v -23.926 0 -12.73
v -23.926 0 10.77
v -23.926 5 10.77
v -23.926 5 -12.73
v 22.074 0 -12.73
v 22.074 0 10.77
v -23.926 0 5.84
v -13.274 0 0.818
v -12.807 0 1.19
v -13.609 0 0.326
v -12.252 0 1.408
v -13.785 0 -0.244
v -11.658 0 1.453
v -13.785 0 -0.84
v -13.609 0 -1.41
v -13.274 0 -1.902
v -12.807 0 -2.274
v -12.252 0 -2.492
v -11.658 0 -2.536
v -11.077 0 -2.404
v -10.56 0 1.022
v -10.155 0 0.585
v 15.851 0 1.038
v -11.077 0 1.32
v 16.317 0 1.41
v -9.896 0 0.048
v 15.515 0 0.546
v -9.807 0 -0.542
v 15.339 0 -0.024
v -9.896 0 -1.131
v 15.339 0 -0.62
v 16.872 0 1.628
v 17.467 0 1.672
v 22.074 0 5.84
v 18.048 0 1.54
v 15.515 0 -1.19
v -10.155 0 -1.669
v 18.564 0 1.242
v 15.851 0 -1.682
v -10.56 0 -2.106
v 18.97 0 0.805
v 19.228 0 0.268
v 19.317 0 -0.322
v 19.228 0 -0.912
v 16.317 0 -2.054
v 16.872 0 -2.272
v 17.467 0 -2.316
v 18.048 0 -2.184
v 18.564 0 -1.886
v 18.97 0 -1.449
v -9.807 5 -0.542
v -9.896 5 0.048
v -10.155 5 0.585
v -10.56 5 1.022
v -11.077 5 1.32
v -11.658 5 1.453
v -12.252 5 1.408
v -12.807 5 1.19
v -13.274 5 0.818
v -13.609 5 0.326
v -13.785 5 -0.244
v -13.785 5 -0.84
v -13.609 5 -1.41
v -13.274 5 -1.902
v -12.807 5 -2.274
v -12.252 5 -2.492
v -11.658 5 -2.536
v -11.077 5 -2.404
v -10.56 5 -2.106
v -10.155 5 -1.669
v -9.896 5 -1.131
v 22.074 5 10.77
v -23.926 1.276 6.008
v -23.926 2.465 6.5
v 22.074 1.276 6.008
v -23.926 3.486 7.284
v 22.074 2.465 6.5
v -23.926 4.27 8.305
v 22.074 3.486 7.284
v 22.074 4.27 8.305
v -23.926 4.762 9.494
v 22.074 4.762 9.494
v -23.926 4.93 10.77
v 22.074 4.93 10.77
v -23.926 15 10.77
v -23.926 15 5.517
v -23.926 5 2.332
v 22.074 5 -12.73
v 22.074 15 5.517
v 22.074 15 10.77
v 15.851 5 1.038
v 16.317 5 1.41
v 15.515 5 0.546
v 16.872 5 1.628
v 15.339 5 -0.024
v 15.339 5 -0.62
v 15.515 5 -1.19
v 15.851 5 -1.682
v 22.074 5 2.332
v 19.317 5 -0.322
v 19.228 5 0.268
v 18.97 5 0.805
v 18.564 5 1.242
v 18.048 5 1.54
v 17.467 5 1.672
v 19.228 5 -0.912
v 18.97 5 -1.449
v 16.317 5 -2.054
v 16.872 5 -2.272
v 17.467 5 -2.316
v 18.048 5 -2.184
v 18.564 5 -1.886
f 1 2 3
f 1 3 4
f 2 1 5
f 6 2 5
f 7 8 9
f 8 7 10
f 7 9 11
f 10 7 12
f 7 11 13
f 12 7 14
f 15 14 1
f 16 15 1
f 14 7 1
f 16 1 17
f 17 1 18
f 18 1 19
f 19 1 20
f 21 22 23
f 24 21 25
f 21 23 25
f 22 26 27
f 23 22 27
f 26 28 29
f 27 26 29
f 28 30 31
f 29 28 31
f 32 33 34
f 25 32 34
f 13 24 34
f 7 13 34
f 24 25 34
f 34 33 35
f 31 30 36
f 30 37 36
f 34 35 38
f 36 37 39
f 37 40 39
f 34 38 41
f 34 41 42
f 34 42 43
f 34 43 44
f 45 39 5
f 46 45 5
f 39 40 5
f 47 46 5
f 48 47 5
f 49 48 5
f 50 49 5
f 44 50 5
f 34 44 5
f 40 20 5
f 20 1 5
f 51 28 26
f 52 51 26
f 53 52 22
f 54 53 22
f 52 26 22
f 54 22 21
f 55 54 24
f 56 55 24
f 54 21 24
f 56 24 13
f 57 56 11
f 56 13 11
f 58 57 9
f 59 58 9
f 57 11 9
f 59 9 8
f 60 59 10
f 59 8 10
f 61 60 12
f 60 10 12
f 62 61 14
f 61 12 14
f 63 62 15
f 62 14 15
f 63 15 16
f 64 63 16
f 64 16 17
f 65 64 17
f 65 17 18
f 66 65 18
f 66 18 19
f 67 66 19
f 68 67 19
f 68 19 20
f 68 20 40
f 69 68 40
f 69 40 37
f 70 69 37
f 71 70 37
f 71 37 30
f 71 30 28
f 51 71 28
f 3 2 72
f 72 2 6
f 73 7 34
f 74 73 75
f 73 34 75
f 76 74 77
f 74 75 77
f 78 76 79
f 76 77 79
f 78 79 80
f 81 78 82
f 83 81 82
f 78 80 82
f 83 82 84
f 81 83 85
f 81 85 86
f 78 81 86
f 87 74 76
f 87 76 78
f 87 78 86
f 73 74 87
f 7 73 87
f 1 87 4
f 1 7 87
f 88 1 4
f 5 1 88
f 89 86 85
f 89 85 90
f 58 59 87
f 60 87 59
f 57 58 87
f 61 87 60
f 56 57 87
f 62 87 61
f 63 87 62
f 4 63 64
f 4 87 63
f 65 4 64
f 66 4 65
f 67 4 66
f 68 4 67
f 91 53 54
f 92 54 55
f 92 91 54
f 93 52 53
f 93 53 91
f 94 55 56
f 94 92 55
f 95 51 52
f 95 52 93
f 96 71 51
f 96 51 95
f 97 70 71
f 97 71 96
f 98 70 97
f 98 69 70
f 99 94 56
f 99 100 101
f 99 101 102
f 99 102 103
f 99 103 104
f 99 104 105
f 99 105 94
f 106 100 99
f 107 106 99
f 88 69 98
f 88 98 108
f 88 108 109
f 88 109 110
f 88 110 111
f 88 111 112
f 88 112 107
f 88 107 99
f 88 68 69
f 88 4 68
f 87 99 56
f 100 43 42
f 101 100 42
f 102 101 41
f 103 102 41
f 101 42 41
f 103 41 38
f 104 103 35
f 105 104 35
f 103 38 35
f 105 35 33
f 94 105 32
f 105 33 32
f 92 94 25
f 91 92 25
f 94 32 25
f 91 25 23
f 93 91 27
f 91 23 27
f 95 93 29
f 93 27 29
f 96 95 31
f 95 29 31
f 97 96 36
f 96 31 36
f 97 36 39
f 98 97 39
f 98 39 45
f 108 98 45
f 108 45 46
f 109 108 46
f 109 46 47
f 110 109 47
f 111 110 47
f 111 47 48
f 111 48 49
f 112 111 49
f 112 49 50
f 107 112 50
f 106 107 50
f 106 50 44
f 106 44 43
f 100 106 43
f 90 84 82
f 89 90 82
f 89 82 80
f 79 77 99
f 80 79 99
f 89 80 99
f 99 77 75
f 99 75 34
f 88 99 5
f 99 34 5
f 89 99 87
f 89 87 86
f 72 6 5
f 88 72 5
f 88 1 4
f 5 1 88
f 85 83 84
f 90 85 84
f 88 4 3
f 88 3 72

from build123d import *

# Parameters (mm, degrees)
SKETCH1_W               = 46
SKETCH1_H               = 23.5
BOSS_EXTRUDE1_DEPTH     = 5
SKETCH2_W               = 46
SKETCH2_H               = 10.437907818
BOSS_EXTRUDE2_DEPTH     = 10
SKETCH1_2_W             = 46
SKETCH1_2_H             = 23.5
BOSS_EXTRUDE3_DEPTH     = 5
SKETCH3_R               = 2
CUT_EXTRUDE1_DEPTH      = 1
CUT_EXTRUDE1_DEPTH_BACK = 16
SKETCH4_R               = 4.930418427
CUT_EXTRUDE2_DEPTH      = 1
CUT_EXTRUDE2_DEPTH_BACK = 47
CUT_EXTRUDE3_DEPTH      = 1
CUT_EXTRUDE3_DEPTH_BACK = 47


with BuildPart() as part:
    # Sketch1 → Boss-Extrude1 (new body)
    with BuildSketch(Plane(origin=(0, 0, 0), x_dir=(1, 0, 0), z_dir=(0, 1, 0))):
        with Locations((-0.926380368, 0.98006135)):
            Rectangle(SKETCH1_W, SKETCH1_H)
    extrude(amount=BOSS_EXTRUDE1_DEPTH)


with BuildPart() as body_2:
    # Sketch2 → Boss-Extrude2 (new body)
    with BuildSketch(Plane(origin=(0, 5, 0), x_dir=(1, 0, 0), z_dir=(0, 1, 0))):
        with Locations((-0.926380368, -5.550984741)):
            Rectangle(SKETCH2_W, SKETCH2_H)
    extrude(amount=BOSS_EXTRUDE2_DEPTH)

    # Sketch1<2> → Boss-Extrude3 (add)
    with BuildSketch(Plane(origin=(0, 0, 0), x_dir=(1, 0, 0), z_dir=(0, 1, 0))):
        with Locations((-0.926380368, 0.98006135)):
            Rectangle(SKETCH1_2_W, SKETCH1_2_H)
    extrude(amount=BOSS_EXTRUDE3_DEPTH)

    # Sketch3 → Cut-Extrude1 (cut, two sides)
    with BuildSketch(Plane.XZ) as cut_extrude1_sk:
        with Locations((17.317152834, -0.321999767)):
            Circle(SKETCH3_R)
        with Locations((-11.807442733, -0.541888977)):
            Circle(SKETCH3_R)
    extrude(amount=CUT_EXTRUDE1_DEPTH, mode=Mode.SUBTRACT)
    extrude(cut_extrude1_sk.sketch, amount=-CUT_EXTRUDE1_DEPTH_BACK, mode=Mode.SUBTRACT)

    # Sketch4 → Cut-Extrude2 (cut, two sides)
    with BuildSketch(Plane(origin=(22.073619632, 0, 0), x_dir=(0, 0, -1), z_dir=(1, 0, 0))) as cut_extrude2_sk:
        with Locations((-10.76993865, 0)):
            Circle(SKETCH4_R)
    extrude(amount=CUT_EXTRUDE2_DEPTH, mode=Mode.SUBTRACT)
    extrude(cut_extrude2_sk.sketch, amount=-CUT_EXTRUDE2_DEPTH_BACK, mode=Mode.SUBTRACT)

    # Sketch5 → Cut-Extrude3 (cut, two sides)
    with BuildSketch(Plane(origin=(22.073619632, 0, 0), x_dir=(0, 0, -1), z_dir=(1, 0, 0))) as cut_extrude3_sk:
        Polygon((-0.332030832, 5), (-2.332030832, 5), (-5.517358605, 15), (-0.332030832, 15), align=None)
    extrude(amount=CUT_EXTRUDE3_DEPTH, mode=Mode.SUBTRACT)
    extrude(cut_extrude3_sk.sketch, amount=-CUT_EXTRUDE3_DEPTH_BACK, mode=Mode.SUBTRACT)


solid = Compound([part.part, body_2.part])
